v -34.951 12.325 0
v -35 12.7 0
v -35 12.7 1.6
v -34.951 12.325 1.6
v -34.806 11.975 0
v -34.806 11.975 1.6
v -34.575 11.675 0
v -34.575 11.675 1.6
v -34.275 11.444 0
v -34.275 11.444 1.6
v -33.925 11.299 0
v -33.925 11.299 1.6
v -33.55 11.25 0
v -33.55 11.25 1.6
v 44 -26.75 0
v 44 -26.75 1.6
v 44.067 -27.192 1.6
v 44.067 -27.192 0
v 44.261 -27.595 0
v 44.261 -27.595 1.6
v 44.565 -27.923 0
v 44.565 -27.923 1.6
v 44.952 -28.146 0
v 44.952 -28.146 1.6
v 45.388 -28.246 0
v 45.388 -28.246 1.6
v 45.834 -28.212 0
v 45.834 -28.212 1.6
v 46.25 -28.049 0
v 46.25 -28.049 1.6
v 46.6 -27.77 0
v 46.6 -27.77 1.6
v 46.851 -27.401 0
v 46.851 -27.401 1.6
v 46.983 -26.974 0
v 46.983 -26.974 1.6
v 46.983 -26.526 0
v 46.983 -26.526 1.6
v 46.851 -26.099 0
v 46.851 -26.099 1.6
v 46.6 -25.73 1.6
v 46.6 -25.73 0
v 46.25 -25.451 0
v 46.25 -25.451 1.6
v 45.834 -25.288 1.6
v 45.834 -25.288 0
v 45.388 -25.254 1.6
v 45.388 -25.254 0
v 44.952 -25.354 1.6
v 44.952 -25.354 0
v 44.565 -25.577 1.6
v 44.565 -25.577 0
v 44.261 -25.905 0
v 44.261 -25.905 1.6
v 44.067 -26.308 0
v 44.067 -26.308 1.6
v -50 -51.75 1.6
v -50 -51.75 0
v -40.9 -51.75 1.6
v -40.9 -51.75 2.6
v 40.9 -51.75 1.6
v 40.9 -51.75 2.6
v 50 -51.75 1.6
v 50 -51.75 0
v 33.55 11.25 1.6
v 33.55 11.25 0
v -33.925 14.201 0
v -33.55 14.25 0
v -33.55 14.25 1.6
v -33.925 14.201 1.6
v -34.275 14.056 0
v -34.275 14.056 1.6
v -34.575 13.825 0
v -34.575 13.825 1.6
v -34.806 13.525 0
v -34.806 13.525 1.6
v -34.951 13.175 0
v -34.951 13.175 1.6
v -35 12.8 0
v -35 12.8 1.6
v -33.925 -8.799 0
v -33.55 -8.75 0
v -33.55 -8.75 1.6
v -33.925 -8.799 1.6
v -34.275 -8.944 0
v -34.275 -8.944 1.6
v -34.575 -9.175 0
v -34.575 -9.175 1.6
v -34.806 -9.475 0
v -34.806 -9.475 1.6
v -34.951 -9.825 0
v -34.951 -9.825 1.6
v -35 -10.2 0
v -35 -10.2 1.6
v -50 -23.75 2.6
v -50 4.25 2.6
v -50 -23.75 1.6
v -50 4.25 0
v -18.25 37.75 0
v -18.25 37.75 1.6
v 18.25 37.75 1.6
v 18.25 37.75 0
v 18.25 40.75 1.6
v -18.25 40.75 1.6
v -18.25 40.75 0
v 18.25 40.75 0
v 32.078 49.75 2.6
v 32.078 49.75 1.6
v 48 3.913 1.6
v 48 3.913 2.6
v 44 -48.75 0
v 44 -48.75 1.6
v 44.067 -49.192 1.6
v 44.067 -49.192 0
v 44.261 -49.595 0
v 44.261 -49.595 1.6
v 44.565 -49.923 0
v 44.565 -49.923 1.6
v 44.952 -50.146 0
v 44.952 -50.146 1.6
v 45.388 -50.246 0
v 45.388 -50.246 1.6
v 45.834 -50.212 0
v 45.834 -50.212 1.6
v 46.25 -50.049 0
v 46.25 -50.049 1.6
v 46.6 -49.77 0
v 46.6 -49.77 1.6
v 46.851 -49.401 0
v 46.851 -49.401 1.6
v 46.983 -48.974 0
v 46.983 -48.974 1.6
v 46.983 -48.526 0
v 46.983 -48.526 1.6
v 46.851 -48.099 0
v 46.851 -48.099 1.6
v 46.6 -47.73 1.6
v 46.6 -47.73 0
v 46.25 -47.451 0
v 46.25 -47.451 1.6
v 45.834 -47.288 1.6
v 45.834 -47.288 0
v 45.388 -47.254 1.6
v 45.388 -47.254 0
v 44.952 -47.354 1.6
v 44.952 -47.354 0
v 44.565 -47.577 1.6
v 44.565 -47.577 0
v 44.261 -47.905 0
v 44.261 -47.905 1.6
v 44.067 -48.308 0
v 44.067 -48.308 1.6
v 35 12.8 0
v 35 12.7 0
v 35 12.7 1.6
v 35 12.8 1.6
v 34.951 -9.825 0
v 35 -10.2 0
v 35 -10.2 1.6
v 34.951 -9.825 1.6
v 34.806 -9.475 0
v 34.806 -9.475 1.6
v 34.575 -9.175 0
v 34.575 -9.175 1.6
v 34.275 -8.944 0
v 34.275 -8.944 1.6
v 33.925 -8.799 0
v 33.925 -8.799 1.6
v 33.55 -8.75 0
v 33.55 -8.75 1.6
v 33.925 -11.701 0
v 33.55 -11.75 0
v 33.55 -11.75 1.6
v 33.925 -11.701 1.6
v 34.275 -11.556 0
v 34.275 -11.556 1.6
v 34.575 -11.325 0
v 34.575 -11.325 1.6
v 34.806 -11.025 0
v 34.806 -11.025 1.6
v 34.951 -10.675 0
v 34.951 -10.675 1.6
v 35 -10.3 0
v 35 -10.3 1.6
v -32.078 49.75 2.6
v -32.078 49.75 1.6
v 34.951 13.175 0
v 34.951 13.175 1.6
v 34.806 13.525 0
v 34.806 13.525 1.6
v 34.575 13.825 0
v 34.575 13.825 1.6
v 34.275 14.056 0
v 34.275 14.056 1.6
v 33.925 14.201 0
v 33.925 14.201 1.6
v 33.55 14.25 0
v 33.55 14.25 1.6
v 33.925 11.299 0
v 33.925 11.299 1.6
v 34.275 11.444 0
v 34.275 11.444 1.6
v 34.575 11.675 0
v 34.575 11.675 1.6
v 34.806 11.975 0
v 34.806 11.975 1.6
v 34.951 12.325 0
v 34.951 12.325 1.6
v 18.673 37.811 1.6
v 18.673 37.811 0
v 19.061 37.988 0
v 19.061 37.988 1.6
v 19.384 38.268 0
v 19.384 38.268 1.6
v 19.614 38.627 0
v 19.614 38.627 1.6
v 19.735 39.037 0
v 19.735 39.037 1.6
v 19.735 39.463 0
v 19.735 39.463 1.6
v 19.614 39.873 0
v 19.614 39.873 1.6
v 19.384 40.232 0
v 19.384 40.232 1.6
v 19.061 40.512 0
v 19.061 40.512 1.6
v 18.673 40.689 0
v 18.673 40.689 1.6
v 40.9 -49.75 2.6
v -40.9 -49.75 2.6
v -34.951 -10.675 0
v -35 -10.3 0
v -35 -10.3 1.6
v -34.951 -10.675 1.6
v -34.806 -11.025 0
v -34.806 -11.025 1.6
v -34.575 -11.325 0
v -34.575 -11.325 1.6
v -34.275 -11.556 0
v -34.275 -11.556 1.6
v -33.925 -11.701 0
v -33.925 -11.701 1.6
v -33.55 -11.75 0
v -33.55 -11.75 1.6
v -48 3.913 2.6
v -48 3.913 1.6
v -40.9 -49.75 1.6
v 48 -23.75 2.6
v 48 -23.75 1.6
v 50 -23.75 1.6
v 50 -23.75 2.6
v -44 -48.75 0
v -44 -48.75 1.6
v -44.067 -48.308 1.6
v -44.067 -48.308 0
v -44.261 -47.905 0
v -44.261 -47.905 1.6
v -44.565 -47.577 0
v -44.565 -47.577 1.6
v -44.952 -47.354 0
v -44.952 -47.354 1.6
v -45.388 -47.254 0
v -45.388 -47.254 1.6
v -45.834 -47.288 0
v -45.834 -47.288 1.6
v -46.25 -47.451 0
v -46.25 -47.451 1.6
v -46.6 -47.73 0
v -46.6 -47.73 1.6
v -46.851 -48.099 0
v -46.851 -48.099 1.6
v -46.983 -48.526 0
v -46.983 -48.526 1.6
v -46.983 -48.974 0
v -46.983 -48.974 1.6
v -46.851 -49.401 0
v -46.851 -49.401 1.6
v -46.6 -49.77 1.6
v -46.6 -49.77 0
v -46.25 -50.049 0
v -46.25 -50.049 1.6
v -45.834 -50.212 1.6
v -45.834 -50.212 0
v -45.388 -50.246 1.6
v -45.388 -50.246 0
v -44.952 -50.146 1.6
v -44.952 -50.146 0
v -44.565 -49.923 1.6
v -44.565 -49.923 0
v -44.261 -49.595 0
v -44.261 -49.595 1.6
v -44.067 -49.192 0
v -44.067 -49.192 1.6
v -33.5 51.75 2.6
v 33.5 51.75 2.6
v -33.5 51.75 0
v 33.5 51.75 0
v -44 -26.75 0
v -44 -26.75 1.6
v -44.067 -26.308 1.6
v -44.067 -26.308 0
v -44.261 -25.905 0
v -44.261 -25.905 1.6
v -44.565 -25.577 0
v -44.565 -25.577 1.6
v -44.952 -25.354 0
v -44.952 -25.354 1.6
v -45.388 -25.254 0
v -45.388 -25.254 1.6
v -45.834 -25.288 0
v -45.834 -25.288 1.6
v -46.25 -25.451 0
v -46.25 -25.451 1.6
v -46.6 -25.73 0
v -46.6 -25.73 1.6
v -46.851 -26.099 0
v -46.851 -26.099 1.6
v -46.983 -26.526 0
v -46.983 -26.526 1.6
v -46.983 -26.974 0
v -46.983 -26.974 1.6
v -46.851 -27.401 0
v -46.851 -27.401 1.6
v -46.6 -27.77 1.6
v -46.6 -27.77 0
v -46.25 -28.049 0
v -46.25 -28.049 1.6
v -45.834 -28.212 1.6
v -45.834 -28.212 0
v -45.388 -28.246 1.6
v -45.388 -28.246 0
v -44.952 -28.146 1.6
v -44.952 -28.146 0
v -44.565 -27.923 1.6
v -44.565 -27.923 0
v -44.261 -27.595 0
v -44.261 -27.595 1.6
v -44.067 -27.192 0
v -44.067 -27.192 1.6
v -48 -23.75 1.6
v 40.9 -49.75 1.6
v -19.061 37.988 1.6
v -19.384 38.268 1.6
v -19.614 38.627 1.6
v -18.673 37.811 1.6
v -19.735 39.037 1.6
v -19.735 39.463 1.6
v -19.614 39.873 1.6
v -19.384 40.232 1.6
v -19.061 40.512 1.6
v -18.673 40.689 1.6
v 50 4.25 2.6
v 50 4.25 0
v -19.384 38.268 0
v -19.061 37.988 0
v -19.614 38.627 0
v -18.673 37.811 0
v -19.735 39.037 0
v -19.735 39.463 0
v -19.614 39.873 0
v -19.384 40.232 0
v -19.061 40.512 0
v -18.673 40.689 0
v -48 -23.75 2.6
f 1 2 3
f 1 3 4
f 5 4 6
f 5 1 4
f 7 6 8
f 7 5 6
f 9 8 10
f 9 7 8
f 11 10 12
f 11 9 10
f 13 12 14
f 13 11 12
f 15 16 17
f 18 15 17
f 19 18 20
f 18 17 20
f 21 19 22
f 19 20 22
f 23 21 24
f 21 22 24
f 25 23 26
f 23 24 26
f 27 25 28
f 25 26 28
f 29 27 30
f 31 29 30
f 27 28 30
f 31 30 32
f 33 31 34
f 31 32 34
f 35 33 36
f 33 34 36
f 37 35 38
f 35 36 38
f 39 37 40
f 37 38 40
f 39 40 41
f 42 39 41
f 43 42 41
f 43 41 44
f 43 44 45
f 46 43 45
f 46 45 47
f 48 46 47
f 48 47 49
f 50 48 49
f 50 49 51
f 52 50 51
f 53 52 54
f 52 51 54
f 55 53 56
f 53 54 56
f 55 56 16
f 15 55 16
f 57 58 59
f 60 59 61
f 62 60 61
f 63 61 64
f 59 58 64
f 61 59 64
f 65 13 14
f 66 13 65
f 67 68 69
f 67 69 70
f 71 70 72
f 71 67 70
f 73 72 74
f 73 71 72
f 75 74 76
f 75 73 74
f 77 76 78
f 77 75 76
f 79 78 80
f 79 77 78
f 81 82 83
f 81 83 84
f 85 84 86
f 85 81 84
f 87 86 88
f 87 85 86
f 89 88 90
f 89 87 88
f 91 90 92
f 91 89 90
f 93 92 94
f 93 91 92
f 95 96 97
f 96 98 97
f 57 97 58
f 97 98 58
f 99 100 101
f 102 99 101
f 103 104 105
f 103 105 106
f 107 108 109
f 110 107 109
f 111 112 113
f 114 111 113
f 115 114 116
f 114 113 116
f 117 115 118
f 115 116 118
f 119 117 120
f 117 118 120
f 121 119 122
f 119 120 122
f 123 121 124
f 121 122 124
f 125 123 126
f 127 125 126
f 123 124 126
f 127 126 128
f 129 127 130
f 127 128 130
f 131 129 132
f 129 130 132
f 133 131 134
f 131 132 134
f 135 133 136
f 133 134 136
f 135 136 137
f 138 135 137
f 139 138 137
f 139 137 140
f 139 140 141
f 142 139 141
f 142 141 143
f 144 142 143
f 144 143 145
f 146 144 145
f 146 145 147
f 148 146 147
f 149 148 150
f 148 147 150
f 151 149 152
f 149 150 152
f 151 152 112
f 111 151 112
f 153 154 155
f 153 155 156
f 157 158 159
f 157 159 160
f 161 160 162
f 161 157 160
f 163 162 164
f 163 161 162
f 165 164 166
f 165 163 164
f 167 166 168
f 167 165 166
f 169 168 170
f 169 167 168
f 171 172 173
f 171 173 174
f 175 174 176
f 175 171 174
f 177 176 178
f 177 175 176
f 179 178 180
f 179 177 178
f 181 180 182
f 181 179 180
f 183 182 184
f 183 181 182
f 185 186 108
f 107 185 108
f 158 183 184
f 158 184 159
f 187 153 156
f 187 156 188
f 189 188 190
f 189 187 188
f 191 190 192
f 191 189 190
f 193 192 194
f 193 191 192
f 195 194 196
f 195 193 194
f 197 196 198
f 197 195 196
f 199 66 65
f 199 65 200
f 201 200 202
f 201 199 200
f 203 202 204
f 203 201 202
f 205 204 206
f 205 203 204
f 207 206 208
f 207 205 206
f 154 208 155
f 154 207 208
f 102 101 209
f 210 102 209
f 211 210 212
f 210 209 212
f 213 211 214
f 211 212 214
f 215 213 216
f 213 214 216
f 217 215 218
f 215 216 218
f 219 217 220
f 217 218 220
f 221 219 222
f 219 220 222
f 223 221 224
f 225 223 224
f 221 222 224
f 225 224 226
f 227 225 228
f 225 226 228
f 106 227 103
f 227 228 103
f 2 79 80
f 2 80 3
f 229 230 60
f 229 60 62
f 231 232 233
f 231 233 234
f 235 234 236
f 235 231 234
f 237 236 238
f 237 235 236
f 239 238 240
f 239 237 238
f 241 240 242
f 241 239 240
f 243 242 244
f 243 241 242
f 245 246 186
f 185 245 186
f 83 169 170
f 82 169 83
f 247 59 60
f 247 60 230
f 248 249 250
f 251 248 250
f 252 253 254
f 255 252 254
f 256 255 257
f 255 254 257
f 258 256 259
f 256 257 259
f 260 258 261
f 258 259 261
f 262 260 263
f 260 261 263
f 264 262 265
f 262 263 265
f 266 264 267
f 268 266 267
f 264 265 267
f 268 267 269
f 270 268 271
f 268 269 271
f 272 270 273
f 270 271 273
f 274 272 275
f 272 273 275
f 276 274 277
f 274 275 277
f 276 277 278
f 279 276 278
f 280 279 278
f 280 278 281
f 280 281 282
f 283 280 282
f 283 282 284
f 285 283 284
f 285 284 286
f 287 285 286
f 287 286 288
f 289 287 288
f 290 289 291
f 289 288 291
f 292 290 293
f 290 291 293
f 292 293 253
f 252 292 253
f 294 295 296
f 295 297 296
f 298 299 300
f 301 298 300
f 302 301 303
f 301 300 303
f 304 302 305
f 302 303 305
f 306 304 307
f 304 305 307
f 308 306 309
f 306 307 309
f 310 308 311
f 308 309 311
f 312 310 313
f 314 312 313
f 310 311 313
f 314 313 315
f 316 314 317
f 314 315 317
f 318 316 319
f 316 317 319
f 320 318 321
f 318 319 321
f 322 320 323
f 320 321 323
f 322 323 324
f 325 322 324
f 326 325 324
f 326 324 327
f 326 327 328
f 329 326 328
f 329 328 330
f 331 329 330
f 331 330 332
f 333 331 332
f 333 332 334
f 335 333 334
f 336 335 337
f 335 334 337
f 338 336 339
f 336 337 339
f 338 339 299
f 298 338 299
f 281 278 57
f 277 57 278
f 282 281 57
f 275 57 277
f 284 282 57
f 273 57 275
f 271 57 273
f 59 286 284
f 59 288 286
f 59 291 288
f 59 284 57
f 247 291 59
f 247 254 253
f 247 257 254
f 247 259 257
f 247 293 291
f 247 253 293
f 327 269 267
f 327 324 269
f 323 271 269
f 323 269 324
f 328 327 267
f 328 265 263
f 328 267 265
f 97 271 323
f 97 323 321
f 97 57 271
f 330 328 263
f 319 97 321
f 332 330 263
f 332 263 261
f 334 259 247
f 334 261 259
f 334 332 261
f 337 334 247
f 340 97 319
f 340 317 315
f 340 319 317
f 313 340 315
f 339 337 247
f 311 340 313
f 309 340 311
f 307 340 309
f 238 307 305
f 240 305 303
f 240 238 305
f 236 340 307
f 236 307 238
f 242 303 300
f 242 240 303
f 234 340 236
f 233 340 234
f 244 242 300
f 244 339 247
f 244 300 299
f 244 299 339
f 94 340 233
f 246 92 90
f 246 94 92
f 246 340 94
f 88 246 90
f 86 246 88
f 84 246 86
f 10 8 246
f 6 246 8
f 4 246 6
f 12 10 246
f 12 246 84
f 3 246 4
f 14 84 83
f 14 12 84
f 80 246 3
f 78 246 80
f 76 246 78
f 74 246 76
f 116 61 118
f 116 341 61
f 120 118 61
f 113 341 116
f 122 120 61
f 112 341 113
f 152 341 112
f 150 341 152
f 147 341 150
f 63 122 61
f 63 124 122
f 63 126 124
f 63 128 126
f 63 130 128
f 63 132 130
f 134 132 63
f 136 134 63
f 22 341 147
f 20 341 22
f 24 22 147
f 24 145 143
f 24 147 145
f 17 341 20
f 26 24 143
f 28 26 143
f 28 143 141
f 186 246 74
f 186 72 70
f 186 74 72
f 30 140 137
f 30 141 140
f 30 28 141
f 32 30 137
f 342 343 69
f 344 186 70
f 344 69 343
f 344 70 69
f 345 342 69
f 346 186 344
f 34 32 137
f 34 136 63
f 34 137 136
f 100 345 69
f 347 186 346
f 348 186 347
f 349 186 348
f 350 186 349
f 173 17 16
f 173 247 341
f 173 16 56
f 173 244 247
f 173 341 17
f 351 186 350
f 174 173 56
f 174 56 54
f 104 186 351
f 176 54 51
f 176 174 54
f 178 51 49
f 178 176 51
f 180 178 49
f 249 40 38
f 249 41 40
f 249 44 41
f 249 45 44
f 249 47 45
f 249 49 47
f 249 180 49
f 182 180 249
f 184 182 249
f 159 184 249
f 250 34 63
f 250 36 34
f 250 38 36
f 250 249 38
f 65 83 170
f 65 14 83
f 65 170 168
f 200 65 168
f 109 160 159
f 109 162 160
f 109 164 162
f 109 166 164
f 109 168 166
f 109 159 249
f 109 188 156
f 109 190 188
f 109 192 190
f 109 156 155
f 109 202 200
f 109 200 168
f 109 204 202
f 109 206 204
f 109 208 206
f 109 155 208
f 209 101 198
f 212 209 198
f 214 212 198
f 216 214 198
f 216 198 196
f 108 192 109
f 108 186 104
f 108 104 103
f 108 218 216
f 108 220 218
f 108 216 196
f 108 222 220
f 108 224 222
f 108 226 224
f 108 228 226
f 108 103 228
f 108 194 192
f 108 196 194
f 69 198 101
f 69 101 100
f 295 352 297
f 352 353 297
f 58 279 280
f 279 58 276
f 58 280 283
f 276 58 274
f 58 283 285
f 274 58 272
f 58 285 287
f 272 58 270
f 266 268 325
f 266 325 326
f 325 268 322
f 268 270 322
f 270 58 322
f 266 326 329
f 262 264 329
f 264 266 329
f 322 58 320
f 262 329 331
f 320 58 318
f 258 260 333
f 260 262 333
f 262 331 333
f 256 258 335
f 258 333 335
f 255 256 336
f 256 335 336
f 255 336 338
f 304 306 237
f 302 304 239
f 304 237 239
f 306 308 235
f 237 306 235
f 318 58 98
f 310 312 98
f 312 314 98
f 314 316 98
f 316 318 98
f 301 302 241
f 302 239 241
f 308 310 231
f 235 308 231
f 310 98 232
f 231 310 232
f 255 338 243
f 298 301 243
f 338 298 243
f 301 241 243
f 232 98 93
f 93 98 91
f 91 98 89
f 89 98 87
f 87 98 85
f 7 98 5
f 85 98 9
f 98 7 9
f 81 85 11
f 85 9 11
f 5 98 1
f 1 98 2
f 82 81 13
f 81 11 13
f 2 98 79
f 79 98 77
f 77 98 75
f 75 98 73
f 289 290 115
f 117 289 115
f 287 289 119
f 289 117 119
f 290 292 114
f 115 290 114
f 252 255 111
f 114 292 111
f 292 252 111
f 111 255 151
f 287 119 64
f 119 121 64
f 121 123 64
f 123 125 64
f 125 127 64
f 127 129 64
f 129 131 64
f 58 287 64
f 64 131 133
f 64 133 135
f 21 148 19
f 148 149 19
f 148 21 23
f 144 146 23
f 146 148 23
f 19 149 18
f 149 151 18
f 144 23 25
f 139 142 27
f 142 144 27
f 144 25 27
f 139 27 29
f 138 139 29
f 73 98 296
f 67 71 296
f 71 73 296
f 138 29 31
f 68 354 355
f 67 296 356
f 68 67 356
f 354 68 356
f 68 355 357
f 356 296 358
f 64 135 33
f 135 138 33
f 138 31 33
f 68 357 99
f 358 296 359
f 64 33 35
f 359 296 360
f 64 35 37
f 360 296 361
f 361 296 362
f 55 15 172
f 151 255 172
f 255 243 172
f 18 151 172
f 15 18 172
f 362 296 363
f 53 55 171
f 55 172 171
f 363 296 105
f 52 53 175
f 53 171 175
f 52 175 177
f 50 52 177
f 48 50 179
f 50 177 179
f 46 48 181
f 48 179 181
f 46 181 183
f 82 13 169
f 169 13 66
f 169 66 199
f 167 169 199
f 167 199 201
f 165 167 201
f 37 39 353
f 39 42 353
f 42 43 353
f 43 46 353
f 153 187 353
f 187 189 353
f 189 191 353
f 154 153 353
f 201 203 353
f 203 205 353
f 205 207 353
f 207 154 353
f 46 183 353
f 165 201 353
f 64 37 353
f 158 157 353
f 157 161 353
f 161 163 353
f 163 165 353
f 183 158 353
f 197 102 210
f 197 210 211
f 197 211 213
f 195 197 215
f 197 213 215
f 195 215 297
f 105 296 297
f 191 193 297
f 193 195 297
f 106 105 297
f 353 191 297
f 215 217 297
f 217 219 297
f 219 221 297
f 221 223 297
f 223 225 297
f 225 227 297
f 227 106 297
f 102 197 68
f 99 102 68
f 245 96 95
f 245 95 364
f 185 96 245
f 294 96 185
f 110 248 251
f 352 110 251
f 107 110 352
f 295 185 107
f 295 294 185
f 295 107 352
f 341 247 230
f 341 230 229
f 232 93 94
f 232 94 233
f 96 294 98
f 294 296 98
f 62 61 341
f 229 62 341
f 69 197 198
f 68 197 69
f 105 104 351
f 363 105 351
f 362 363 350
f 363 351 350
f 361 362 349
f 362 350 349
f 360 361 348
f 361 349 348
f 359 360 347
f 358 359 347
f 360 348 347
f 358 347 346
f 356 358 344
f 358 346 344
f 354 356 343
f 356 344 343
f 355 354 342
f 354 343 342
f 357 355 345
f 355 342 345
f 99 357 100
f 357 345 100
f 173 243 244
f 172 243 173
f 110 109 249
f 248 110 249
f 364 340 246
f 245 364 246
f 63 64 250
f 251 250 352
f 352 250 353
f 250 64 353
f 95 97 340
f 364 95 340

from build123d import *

# Parameters (mm, degrees)
BOSS_EXTRUDE1_DEPTH = 1.6
SKETCH4_R           = 1.5
CUT_EXTRUDE1_DEPTH  = 1.6
SKETCH5_R           = 1.5
CUT_EXTRUDE2_DEPTH  = 1.6
SKETCH6_W           = 36.5
SKETCH6_H           = 3
CUT_EXTRUDE3_DEPTH  = 1.6
CUT_EXTRUDE4_DEPTH  = 1.6
CUT_EXTRUDE5_DEPTH  = 1.6
BOSS_EXTRUDE3_START = 1.6
SKETCH9_W           = 81.8
SKETCH9_H           = 2
BOSS_EXTRUDE3_DEPTH = 1


with BuildPart() as part:
    # Sketch2 → Boss-Extrude1 (new body)
    with BuildSketch(Plane.XY):
        Polygon((50, -51.75), (50, 4.25), (33.5, 51.75), (-33.5, 51.75), (-50, 4.25), (-50, -51.75), align=None)
    extrude(amount=BOSS_EXTRUDE1_DEPTH)

    # Sketch4 → Cut-Extrude1 (cut)
    with BuildSketch(Plane.XY.offset(1.6)):
        with Locations((-45.5, -48.75)):
            Circle(SKETCH4_R)
        with Locations((-45.5, -26.75)):
            Circle(SKETCH4_R)
        with Locations(Location((45.5, -26.75, 0), (0, 0, 180))):
            Circle(SKETCH4_R)
        with Locations(Location((45.5, -48.75, 0), (0, 0, 180))):
            Circle(SKETCH4_R)
    extrude(amount=-CUT_EXTRUDE1_DEPTH, mode=Mode.SUBTRACT)

    # Sketch5 → Cut-Extrude2 (cut)
    with BuildSketch(Plane.XY.offset(1.6)):
        with Locations((-18.25, 39.25)):
            Circle(SKETCH5_R)
        with Locations(Location((18.25, 39.25, 0), (0, 0, 180))):
            Circle(SKETCH5_R)
    extrude(amount=-CUT_EXTRUDE2_DEPTH, mode=Mode.SUBTRACT)

    # Sketch6 → Cut-Extrude3 (cut)
    with BuildSketch(Plane.XY.offset(1.6)):
        with Locations((0, 39.25)):
            Rectangle(SKETCH6_W, SKETCH6_H)
    extrude(amount=-CUT_EXTRUDE3_DEPTH, mode=Mode.SUBTRACT)

    # Sketch7 → Cut-Extrude4 (cut)
    with BuildSketch(Plane.XY):
        with BuildLine():
            Line((-33.55, -11.75), (33.55, -11.75))
            ThreePointArc((33.55, -11.75), (34.575304833, -11.325304833), (35, -10.3))
            Line((35, -10.3), (35, -10.2))
            ThreePointArc((35, -10.2), (34.575304833, -9.174695167), (33.55, -8.75))
            Line((33.55, -8.75), (-33.55, -8.75))
            ThreePointArc((-33.55, -8.75), (-34.575304833, -9.174695167), (-35, -10.2))
            Line((-35, -10.2), (-35, -10.3))
            ThreePointArc((-35, -10.3), (-34.575304833, -11.325304833), (-33.55, -11.75))
        make_face()
    extrude(amount=CUT_EXTRUDE4_DEPTH, mode=Mode.SUBTRACT)

    # Sketch8 → Cut-Extrude5 (cut)
    with BuildSketch(Plane.XY):
        with BuildLine():
            Line((-33.55, 11.25), (33.55, 11.25))
            ThreePointArc((33.55, 11.25), (34.575304833, 11.674695167), (35, 12.7))
            Line((35, 12.7), (35, 12.8))
            ThreePointArc((35, 12.8), (34.575304833, 13.825304833), (33.55, 14.25))
            Line((33.55, 14.25), (-33.55, 14.25))
            ThreePointArc((-33.55, 14.25), (-34.575304833, 13.825304833), (-35, 12.8))
            Line((-35, 12.8), (-35, 12.7))
            ThreePointArc((-35, 12.7), (-34.575304833, 11.674695167), (-33.55, 11.25))
        make_face()
    extrude(amount=CUT_EXTRUDE5_DEPTH, mode=Mode.SUBTRACT)

    # Sketch9 → Boss-Extrude3 (add)
    with BuildSketch(Plane.XY.offset(BOSS_EXTRUDE3_START)):
        Polygon((50, -23.75), (50, 4.25), (33.5, 51.75), (-33.5, 51.75), (-50, 4.25), (-50, -23.75), (-48, -23.75), (-48, 3.91252214), (-32.077507691, 49.75), (32.077507691, 49.75), (48, 3.91252214), (48, -23.75), align=None)
        with Locations((0, -50.75)):
            Rectangle(SKETCH9_W, SKETCH9_H)
    extrude(amount=BOSS_EXTRUDE3_DEPTH)


solid = part.part
